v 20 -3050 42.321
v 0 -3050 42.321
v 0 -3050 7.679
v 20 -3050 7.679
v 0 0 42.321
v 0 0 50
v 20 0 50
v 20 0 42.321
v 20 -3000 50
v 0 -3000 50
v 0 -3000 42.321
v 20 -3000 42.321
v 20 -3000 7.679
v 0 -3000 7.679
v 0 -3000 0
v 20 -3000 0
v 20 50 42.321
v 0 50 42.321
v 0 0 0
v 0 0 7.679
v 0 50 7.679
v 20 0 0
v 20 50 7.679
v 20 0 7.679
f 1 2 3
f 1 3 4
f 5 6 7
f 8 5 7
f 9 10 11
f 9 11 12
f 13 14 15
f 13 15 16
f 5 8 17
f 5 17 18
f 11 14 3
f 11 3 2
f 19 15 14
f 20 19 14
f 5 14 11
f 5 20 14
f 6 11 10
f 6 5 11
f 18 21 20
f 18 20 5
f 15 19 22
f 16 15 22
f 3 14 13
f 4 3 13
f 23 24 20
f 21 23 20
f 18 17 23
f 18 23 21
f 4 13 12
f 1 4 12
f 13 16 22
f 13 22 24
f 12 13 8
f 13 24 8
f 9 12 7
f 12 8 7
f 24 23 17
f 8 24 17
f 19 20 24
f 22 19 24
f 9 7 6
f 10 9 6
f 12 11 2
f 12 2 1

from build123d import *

# Parameters (mm, degrees)
F0_W     = 10
F0_H     = 50
F1_DEPTH = 3000
F2_W     = 20
F2_H     = 34.641016
F3_DEPTH = 50
F4_W     = 20
F4_H     = 34.641016
F5_DEPTH = 50


with BuildPart() as f1:
    # F0 (on Front) → F1 (new body)
    with BuildSketch(Plane.XZ):
        with Locations((5, 25)):
            Rectangle(F0_W, F0_H)
        with Locations((15, 25)):
            Rectangle(F0_W, F0_H)
    extrude(amount=F1_DEPTH)

    # F2 (on face) → F3 (join)
    with BuildSketch(Plane.XZ.offset(3000)):
        with Locations((10, 25)):
            Rectangle(F2_W, F2_H)
    extrude(amount=F3_DEPTH)

    # F4 (on face) → F5 (join)
    with BuildSketch(Plane(origin=(0, 0, 0), x_dir=(-1, 0, 0), z_dir=(0, 1, 0))):
        with Locations((-10, 25)):
            Rectangle(F4_W, F4_H)
    extrude(amount=F5_DEPTH)


solid = f1.part
